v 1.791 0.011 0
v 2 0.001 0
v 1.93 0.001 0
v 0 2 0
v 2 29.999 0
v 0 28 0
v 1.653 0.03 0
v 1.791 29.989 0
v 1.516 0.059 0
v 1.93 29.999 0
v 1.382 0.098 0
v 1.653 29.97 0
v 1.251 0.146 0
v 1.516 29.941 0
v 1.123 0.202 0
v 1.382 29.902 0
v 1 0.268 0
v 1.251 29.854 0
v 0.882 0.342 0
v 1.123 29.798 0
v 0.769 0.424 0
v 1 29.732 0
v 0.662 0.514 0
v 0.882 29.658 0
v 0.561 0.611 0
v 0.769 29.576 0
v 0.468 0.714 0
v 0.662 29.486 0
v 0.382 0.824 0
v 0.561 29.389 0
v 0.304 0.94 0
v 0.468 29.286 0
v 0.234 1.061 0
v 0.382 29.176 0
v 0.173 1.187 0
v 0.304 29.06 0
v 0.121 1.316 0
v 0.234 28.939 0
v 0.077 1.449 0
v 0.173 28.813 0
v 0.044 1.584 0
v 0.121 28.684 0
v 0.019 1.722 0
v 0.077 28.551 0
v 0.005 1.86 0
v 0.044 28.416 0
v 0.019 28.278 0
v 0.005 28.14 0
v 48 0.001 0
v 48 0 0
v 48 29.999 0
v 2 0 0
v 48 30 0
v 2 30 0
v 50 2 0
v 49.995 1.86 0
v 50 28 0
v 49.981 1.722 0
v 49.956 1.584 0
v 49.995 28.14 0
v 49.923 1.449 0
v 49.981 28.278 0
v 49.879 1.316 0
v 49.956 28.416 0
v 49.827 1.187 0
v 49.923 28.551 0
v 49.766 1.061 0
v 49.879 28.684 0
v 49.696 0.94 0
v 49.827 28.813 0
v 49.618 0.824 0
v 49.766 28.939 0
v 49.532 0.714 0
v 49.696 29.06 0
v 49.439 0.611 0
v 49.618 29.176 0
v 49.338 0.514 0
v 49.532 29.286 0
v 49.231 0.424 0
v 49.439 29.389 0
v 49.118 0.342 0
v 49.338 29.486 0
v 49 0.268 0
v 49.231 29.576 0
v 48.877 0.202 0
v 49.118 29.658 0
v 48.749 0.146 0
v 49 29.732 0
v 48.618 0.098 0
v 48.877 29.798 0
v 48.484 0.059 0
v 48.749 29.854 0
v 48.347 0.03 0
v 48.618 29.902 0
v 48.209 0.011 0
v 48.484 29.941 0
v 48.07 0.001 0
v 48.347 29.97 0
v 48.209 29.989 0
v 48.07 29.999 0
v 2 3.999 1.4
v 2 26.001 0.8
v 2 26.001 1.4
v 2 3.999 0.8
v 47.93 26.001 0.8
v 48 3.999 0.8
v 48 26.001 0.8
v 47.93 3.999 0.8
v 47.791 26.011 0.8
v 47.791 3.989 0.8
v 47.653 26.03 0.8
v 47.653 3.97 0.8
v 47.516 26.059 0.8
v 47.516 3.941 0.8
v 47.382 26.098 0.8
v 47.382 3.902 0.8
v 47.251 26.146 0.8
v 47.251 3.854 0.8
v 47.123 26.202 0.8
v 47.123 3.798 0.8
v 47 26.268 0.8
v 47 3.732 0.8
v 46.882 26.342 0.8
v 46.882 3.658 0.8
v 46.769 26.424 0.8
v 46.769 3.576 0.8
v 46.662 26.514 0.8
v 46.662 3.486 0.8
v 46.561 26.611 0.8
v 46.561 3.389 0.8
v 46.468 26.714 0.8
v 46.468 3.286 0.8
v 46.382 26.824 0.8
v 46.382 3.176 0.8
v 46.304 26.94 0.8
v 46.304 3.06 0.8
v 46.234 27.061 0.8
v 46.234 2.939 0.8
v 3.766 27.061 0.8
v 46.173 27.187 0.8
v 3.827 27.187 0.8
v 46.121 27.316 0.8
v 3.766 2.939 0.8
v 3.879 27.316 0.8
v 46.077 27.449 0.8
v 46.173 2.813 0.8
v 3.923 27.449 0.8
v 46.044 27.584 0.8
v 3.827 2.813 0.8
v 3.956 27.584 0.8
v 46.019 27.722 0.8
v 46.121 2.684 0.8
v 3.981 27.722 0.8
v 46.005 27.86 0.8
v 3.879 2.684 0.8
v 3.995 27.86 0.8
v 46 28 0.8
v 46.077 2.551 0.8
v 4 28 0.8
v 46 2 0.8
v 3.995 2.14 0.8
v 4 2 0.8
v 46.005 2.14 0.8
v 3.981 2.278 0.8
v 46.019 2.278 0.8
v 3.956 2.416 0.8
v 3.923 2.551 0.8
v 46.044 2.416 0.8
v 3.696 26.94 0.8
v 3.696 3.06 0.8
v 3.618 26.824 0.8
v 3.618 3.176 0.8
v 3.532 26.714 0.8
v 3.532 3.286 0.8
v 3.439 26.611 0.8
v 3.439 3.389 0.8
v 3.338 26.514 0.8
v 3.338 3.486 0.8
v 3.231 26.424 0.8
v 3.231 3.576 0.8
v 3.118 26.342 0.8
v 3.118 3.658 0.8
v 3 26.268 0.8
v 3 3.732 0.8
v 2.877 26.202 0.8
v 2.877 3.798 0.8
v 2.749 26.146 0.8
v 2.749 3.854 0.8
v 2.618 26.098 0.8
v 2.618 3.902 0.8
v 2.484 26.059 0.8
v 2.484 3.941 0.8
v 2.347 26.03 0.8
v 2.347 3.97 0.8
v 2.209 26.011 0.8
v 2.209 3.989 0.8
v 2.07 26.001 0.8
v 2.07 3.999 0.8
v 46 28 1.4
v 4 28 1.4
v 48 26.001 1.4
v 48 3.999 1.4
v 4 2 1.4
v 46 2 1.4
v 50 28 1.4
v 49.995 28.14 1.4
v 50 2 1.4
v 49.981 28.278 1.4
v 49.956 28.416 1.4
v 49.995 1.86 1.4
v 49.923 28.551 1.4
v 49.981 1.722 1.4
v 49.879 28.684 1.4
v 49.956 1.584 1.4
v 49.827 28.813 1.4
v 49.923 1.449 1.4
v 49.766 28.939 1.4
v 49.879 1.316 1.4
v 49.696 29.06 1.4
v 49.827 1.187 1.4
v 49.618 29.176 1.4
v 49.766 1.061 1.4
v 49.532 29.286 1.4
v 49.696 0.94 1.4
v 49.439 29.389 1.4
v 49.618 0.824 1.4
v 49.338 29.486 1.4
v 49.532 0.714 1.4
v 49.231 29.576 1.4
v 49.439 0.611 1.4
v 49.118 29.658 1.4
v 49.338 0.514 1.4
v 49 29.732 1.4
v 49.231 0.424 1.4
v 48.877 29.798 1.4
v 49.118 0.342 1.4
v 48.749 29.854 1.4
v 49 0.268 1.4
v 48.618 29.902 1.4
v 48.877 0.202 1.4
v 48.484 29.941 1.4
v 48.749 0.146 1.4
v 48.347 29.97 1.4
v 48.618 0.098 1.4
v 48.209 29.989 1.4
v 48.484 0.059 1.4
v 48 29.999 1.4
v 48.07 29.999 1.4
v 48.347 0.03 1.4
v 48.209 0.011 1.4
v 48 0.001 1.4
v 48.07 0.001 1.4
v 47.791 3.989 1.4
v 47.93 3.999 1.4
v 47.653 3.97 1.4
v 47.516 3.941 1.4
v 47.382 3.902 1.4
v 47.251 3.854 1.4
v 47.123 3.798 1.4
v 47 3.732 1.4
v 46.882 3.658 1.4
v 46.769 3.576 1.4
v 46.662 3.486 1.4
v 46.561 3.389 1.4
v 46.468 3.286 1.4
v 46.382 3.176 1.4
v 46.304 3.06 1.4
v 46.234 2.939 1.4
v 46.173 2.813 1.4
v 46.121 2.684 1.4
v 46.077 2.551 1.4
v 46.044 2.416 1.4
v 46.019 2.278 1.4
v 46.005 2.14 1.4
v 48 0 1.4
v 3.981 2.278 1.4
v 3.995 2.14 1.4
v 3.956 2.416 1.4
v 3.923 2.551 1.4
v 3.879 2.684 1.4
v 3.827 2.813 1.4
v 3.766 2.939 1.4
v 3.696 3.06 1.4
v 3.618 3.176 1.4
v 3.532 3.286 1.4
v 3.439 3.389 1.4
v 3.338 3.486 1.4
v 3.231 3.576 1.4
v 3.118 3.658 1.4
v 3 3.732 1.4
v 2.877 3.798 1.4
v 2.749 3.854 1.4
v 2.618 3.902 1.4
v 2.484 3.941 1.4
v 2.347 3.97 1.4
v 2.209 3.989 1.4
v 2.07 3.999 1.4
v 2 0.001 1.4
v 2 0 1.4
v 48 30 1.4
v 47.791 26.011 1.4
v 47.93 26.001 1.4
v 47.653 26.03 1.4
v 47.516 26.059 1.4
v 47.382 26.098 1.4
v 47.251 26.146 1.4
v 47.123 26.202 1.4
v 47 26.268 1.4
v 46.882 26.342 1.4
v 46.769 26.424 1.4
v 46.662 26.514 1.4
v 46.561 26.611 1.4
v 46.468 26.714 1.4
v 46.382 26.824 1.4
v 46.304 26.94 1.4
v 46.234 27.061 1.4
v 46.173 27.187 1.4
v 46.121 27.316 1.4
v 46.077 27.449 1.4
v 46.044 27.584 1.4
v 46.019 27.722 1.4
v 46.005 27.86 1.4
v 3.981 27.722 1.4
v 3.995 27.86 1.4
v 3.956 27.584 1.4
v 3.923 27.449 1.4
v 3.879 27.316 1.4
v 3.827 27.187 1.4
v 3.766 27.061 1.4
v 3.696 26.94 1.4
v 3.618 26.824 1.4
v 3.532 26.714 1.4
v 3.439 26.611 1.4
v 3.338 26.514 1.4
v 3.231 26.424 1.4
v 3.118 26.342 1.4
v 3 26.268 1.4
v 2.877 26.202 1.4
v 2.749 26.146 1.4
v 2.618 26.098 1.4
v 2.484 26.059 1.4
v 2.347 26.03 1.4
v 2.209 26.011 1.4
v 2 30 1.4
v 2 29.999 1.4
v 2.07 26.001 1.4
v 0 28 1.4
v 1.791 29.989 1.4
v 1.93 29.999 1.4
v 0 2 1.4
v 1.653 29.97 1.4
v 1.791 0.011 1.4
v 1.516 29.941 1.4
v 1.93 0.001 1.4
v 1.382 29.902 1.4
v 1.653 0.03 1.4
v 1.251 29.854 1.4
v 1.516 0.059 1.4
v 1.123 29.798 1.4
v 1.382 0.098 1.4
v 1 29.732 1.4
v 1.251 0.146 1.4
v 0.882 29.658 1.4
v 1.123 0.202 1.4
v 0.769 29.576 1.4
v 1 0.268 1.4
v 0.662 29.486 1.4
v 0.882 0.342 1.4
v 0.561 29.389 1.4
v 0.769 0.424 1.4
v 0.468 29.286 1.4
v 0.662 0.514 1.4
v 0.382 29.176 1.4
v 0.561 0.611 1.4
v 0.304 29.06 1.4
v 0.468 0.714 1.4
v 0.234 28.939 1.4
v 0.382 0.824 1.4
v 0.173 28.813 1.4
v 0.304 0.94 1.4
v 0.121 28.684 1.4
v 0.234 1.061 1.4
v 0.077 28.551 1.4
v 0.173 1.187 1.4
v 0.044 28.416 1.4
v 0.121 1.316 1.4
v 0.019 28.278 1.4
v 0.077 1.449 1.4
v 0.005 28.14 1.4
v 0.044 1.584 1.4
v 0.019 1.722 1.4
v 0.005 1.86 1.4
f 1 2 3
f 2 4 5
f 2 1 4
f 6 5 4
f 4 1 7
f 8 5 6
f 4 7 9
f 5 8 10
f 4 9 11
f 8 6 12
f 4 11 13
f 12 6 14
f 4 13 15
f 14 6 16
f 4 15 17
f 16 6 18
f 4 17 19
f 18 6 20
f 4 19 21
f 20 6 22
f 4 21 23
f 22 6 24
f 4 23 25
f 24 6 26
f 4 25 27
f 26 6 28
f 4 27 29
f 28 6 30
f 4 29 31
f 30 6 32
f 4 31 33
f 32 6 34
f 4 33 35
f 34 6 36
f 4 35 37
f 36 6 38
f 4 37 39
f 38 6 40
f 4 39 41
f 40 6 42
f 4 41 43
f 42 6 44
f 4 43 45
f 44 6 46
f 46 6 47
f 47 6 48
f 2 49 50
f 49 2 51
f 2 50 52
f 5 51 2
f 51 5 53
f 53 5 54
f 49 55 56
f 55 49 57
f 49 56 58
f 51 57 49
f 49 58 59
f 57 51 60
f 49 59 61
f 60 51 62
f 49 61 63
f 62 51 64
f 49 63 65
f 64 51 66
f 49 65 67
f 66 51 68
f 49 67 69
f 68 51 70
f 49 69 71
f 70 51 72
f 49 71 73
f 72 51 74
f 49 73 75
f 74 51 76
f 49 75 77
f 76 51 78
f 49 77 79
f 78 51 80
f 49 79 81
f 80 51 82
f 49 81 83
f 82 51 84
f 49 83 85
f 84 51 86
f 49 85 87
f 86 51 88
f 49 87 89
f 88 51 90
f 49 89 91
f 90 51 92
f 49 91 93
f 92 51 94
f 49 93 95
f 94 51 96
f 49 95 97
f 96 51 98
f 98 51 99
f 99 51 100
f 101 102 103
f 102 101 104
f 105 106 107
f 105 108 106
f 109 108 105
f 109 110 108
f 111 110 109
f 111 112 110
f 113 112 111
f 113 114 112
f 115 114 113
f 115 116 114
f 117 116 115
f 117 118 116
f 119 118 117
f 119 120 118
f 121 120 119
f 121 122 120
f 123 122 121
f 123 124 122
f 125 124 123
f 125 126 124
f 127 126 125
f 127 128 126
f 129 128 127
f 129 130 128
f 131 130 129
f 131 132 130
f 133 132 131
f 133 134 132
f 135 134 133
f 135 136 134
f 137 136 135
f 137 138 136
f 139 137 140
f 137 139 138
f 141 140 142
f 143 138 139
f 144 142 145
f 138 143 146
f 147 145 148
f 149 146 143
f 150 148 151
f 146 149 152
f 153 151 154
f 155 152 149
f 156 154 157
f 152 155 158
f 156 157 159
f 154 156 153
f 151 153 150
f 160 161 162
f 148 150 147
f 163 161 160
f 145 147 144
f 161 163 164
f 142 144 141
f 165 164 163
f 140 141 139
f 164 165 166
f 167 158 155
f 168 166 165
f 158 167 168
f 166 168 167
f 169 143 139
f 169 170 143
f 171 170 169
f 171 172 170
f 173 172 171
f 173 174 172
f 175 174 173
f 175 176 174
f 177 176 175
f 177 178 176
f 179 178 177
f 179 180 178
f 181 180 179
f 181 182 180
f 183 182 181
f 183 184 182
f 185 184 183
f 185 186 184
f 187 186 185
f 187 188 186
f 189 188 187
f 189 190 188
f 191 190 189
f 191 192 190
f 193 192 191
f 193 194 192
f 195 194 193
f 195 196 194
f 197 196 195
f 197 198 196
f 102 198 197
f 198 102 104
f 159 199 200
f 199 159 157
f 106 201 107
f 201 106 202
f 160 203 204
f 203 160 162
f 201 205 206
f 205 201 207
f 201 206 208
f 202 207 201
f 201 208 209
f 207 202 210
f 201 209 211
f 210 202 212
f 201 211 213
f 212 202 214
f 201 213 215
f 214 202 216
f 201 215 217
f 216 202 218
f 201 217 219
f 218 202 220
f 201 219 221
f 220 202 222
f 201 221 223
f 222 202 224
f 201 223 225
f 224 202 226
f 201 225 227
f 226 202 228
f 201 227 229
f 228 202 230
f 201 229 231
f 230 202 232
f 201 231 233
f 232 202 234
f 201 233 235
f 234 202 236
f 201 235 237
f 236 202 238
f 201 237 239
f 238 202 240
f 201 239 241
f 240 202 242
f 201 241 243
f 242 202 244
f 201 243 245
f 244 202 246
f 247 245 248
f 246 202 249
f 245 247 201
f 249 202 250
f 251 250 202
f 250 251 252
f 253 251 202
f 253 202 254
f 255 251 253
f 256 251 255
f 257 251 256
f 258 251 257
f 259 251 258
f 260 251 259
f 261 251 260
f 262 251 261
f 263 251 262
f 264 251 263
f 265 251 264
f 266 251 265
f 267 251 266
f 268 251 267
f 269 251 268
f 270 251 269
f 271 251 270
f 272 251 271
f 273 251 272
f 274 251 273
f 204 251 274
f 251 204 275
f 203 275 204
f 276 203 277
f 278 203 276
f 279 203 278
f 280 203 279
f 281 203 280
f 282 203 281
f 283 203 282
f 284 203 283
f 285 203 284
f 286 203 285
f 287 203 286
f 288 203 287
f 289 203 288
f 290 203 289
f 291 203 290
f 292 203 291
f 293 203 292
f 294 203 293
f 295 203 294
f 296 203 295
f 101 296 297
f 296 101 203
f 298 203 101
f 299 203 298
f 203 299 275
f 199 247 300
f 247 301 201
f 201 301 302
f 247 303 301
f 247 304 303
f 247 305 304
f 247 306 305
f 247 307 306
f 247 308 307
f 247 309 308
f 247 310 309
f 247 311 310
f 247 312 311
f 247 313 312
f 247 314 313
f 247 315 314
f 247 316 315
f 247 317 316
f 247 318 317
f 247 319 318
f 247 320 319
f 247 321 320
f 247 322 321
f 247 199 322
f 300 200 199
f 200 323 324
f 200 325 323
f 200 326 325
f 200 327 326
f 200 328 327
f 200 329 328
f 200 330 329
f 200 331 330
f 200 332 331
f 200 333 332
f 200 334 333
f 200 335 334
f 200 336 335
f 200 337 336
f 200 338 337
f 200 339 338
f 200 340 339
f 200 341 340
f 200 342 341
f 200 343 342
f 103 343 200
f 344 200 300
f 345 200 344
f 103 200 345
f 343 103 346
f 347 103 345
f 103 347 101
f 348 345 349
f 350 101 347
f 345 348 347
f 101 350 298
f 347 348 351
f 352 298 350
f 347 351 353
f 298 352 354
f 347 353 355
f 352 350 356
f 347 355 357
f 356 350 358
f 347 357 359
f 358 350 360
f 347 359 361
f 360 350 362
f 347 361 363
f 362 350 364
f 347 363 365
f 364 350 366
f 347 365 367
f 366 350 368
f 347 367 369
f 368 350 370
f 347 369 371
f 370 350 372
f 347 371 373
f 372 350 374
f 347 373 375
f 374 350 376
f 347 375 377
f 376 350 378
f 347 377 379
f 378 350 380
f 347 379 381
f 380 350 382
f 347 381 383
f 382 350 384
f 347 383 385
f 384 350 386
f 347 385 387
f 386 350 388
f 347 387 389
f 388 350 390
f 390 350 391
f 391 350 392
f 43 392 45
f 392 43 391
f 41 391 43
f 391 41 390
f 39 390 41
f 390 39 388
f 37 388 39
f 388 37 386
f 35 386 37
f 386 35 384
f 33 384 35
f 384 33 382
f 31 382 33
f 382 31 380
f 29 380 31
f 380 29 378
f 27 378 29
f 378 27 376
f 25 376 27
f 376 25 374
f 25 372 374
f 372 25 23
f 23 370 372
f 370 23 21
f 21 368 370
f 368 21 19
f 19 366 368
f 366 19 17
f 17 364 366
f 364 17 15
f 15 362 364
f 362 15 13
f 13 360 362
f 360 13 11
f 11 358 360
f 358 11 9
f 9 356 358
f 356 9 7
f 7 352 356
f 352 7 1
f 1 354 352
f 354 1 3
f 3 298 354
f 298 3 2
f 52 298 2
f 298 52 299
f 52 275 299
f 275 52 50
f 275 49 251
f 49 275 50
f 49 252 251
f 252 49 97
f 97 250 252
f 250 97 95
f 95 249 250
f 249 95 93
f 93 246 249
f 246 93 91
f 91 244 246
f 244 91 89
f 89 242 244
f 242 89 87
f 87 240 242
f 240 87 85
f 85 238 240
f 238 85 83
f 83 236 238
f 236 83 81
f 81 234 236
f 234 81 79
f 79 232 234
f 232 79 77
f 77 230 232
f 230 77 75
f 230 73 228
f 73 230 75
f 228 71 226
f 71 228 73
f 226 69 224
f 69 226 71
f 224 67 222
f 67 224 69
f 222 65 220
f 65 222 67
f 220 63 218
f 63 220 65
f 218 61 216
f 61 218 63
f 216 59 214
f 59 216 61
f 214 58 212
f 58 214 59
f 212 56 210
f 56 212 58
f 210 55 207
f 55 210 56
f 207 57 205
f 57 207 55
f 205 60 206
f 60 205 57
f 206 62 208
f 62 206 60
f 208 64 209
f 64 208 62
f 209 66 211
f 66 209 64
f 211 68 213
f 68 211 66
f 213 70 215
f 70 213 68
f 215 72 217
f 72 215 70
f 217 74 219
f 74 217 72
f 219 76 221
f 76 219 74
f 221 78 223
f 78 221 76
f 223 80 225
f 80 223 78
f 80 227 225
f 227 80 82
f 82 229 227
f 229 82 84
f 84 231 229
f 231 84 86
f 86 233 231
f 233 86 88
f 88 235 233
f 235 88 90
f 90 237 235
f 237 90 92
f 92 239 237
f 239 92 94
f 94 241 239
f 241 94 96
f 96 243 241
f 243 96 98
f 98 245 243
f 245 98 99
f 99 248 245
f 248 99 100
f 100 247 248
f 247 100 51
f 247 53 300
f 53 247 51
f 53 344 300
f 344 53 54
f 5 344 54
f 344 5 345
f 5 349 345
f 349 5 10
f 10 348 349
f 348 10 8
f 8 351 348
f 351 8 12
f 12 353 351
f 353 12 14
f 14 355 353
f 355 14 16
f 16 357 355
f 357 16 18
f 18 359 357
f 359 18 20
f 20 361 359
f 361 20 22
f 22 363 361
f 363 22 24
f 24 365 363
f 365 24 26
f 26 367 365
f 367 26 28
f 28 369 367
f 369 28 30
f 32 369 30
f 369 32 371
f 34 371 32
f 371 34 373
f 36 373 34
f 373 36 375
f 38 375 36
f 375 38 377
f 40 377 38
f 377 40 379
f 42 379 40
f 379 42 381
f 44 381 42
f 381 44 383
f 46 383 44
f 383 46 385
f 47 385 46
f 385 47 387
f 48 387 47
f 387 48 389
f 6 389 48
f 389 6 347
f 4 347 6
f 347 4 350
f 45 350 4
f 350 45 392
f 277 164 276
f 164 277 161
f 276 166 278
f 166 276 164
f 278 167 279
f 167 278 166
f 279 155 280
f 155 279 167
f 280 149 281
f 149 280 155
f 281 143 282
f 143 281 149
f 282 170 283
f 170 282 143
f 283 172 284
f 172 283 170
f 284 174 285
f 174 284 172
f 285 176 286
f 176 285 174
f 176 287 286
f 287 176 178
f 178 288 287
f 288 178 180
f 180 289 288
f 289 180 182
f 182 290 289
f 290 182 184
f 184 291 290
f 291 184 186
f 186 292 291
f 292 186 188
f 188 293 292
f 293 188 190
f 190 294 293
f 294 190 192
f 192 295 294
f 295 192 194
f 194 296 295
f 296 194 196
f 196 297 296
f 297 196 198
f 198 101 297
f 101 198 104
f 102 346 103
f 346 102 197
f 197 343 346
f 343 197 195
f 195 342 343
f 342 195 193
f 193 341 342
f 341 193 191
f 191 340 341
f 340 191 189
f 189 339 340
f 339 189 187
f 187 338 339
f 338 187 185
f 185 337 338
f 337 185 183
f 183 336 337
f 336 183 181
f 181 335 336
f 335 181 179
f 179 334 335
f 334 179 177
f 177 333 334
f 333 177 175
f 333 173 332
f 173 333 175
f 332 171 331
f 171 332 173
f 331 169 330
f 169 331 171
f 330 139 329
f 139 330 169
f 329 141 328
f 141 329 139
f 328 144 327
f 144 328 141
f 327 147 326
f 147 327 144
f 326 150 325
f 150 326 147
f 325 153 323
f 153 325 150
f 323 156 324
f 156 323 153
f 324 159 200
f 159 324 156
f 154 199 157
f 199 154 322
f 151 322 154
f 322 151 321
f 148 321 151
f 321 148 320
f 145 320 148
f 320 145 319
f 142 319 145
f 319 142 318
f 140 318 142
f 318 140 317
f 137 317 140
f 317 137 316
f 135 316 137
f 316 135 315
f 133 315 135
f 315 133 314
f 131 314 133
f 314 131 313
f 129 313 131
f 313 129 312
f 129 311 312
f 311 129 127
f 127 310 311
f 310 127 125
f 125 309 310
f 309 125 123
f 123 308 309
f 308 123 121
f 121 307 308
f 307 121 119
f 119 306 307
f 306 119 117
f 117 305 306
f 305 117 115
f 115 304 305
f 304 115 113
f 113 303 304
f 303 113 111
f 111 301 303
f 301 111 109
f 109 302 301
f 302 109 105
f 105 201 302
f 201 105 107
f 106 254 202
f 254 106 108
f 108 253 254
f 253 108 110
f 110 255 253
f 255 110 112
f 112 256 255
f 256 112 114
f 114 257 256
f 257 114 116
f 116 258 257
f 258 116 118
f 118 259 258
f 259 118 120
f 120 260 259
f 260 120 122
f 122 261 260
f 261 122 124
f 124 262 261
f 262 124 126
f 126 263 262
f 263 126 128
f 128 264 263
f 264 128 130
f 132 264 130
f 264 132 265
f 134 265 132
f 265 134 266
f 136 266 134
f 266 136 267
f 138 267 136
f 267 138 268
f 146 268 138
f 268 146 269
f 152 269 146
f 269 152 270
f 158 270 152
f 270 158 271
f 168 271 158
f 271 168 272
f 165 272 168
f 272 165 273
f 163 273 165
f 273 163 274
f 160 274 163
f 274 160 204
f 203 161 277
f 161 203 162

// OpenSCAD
//: $fn, facttes resolution 
detail = 90; // [8:90]

// include <ear.scad>;

//: radius of warp preventing ears. A value of 0 disables ears
ear_radius = 0; // [0:20]

//: platelet height:
platelet_height = 30;  // [20:120]

//: platelet width:
platelet_width = 50;  // [30:180]

//: radius of corners, also width of frame:
corner_radius = 2; // [0:9]

module ear(x, y, r)  {			// radius of 0 disables ears.  a circle with radius 0 should have
	if(r) {				// same effect, but I didn't test. Conditionally makes certain that
		linear_extrude(0.2)  {	// radius 0 means no ears and no artefacts.
			translate([x, y])
			circle(r);
		}
	}
}


module Trennplatte(l, t, h, r)  {
// ears
	for(x=[r:l-2*r:l], y=[r:t-2*r:t])		ear(x, y, ear_radius);

// base plate
	linear_extrude(h)	translate([r,   r])	square([l-2*r, t-2*r]);

// frame and corners
	linear_extrude(1.4)  {
		for(x=[r:l-2*r:l], y=[r:t-2*r:t])	translate([x, y]) circle(r, $fn=detail);
		for(x=[0,l-r,l-r]) translate([x, r])	square([r, t-2*r]);
		for(y=[0,t-r,t-r]) translate([r, y])	square([l-2*r, r]);
	}
}

Trennplatte(platelet_width, platelet_height, 0.8, corner_radius);
